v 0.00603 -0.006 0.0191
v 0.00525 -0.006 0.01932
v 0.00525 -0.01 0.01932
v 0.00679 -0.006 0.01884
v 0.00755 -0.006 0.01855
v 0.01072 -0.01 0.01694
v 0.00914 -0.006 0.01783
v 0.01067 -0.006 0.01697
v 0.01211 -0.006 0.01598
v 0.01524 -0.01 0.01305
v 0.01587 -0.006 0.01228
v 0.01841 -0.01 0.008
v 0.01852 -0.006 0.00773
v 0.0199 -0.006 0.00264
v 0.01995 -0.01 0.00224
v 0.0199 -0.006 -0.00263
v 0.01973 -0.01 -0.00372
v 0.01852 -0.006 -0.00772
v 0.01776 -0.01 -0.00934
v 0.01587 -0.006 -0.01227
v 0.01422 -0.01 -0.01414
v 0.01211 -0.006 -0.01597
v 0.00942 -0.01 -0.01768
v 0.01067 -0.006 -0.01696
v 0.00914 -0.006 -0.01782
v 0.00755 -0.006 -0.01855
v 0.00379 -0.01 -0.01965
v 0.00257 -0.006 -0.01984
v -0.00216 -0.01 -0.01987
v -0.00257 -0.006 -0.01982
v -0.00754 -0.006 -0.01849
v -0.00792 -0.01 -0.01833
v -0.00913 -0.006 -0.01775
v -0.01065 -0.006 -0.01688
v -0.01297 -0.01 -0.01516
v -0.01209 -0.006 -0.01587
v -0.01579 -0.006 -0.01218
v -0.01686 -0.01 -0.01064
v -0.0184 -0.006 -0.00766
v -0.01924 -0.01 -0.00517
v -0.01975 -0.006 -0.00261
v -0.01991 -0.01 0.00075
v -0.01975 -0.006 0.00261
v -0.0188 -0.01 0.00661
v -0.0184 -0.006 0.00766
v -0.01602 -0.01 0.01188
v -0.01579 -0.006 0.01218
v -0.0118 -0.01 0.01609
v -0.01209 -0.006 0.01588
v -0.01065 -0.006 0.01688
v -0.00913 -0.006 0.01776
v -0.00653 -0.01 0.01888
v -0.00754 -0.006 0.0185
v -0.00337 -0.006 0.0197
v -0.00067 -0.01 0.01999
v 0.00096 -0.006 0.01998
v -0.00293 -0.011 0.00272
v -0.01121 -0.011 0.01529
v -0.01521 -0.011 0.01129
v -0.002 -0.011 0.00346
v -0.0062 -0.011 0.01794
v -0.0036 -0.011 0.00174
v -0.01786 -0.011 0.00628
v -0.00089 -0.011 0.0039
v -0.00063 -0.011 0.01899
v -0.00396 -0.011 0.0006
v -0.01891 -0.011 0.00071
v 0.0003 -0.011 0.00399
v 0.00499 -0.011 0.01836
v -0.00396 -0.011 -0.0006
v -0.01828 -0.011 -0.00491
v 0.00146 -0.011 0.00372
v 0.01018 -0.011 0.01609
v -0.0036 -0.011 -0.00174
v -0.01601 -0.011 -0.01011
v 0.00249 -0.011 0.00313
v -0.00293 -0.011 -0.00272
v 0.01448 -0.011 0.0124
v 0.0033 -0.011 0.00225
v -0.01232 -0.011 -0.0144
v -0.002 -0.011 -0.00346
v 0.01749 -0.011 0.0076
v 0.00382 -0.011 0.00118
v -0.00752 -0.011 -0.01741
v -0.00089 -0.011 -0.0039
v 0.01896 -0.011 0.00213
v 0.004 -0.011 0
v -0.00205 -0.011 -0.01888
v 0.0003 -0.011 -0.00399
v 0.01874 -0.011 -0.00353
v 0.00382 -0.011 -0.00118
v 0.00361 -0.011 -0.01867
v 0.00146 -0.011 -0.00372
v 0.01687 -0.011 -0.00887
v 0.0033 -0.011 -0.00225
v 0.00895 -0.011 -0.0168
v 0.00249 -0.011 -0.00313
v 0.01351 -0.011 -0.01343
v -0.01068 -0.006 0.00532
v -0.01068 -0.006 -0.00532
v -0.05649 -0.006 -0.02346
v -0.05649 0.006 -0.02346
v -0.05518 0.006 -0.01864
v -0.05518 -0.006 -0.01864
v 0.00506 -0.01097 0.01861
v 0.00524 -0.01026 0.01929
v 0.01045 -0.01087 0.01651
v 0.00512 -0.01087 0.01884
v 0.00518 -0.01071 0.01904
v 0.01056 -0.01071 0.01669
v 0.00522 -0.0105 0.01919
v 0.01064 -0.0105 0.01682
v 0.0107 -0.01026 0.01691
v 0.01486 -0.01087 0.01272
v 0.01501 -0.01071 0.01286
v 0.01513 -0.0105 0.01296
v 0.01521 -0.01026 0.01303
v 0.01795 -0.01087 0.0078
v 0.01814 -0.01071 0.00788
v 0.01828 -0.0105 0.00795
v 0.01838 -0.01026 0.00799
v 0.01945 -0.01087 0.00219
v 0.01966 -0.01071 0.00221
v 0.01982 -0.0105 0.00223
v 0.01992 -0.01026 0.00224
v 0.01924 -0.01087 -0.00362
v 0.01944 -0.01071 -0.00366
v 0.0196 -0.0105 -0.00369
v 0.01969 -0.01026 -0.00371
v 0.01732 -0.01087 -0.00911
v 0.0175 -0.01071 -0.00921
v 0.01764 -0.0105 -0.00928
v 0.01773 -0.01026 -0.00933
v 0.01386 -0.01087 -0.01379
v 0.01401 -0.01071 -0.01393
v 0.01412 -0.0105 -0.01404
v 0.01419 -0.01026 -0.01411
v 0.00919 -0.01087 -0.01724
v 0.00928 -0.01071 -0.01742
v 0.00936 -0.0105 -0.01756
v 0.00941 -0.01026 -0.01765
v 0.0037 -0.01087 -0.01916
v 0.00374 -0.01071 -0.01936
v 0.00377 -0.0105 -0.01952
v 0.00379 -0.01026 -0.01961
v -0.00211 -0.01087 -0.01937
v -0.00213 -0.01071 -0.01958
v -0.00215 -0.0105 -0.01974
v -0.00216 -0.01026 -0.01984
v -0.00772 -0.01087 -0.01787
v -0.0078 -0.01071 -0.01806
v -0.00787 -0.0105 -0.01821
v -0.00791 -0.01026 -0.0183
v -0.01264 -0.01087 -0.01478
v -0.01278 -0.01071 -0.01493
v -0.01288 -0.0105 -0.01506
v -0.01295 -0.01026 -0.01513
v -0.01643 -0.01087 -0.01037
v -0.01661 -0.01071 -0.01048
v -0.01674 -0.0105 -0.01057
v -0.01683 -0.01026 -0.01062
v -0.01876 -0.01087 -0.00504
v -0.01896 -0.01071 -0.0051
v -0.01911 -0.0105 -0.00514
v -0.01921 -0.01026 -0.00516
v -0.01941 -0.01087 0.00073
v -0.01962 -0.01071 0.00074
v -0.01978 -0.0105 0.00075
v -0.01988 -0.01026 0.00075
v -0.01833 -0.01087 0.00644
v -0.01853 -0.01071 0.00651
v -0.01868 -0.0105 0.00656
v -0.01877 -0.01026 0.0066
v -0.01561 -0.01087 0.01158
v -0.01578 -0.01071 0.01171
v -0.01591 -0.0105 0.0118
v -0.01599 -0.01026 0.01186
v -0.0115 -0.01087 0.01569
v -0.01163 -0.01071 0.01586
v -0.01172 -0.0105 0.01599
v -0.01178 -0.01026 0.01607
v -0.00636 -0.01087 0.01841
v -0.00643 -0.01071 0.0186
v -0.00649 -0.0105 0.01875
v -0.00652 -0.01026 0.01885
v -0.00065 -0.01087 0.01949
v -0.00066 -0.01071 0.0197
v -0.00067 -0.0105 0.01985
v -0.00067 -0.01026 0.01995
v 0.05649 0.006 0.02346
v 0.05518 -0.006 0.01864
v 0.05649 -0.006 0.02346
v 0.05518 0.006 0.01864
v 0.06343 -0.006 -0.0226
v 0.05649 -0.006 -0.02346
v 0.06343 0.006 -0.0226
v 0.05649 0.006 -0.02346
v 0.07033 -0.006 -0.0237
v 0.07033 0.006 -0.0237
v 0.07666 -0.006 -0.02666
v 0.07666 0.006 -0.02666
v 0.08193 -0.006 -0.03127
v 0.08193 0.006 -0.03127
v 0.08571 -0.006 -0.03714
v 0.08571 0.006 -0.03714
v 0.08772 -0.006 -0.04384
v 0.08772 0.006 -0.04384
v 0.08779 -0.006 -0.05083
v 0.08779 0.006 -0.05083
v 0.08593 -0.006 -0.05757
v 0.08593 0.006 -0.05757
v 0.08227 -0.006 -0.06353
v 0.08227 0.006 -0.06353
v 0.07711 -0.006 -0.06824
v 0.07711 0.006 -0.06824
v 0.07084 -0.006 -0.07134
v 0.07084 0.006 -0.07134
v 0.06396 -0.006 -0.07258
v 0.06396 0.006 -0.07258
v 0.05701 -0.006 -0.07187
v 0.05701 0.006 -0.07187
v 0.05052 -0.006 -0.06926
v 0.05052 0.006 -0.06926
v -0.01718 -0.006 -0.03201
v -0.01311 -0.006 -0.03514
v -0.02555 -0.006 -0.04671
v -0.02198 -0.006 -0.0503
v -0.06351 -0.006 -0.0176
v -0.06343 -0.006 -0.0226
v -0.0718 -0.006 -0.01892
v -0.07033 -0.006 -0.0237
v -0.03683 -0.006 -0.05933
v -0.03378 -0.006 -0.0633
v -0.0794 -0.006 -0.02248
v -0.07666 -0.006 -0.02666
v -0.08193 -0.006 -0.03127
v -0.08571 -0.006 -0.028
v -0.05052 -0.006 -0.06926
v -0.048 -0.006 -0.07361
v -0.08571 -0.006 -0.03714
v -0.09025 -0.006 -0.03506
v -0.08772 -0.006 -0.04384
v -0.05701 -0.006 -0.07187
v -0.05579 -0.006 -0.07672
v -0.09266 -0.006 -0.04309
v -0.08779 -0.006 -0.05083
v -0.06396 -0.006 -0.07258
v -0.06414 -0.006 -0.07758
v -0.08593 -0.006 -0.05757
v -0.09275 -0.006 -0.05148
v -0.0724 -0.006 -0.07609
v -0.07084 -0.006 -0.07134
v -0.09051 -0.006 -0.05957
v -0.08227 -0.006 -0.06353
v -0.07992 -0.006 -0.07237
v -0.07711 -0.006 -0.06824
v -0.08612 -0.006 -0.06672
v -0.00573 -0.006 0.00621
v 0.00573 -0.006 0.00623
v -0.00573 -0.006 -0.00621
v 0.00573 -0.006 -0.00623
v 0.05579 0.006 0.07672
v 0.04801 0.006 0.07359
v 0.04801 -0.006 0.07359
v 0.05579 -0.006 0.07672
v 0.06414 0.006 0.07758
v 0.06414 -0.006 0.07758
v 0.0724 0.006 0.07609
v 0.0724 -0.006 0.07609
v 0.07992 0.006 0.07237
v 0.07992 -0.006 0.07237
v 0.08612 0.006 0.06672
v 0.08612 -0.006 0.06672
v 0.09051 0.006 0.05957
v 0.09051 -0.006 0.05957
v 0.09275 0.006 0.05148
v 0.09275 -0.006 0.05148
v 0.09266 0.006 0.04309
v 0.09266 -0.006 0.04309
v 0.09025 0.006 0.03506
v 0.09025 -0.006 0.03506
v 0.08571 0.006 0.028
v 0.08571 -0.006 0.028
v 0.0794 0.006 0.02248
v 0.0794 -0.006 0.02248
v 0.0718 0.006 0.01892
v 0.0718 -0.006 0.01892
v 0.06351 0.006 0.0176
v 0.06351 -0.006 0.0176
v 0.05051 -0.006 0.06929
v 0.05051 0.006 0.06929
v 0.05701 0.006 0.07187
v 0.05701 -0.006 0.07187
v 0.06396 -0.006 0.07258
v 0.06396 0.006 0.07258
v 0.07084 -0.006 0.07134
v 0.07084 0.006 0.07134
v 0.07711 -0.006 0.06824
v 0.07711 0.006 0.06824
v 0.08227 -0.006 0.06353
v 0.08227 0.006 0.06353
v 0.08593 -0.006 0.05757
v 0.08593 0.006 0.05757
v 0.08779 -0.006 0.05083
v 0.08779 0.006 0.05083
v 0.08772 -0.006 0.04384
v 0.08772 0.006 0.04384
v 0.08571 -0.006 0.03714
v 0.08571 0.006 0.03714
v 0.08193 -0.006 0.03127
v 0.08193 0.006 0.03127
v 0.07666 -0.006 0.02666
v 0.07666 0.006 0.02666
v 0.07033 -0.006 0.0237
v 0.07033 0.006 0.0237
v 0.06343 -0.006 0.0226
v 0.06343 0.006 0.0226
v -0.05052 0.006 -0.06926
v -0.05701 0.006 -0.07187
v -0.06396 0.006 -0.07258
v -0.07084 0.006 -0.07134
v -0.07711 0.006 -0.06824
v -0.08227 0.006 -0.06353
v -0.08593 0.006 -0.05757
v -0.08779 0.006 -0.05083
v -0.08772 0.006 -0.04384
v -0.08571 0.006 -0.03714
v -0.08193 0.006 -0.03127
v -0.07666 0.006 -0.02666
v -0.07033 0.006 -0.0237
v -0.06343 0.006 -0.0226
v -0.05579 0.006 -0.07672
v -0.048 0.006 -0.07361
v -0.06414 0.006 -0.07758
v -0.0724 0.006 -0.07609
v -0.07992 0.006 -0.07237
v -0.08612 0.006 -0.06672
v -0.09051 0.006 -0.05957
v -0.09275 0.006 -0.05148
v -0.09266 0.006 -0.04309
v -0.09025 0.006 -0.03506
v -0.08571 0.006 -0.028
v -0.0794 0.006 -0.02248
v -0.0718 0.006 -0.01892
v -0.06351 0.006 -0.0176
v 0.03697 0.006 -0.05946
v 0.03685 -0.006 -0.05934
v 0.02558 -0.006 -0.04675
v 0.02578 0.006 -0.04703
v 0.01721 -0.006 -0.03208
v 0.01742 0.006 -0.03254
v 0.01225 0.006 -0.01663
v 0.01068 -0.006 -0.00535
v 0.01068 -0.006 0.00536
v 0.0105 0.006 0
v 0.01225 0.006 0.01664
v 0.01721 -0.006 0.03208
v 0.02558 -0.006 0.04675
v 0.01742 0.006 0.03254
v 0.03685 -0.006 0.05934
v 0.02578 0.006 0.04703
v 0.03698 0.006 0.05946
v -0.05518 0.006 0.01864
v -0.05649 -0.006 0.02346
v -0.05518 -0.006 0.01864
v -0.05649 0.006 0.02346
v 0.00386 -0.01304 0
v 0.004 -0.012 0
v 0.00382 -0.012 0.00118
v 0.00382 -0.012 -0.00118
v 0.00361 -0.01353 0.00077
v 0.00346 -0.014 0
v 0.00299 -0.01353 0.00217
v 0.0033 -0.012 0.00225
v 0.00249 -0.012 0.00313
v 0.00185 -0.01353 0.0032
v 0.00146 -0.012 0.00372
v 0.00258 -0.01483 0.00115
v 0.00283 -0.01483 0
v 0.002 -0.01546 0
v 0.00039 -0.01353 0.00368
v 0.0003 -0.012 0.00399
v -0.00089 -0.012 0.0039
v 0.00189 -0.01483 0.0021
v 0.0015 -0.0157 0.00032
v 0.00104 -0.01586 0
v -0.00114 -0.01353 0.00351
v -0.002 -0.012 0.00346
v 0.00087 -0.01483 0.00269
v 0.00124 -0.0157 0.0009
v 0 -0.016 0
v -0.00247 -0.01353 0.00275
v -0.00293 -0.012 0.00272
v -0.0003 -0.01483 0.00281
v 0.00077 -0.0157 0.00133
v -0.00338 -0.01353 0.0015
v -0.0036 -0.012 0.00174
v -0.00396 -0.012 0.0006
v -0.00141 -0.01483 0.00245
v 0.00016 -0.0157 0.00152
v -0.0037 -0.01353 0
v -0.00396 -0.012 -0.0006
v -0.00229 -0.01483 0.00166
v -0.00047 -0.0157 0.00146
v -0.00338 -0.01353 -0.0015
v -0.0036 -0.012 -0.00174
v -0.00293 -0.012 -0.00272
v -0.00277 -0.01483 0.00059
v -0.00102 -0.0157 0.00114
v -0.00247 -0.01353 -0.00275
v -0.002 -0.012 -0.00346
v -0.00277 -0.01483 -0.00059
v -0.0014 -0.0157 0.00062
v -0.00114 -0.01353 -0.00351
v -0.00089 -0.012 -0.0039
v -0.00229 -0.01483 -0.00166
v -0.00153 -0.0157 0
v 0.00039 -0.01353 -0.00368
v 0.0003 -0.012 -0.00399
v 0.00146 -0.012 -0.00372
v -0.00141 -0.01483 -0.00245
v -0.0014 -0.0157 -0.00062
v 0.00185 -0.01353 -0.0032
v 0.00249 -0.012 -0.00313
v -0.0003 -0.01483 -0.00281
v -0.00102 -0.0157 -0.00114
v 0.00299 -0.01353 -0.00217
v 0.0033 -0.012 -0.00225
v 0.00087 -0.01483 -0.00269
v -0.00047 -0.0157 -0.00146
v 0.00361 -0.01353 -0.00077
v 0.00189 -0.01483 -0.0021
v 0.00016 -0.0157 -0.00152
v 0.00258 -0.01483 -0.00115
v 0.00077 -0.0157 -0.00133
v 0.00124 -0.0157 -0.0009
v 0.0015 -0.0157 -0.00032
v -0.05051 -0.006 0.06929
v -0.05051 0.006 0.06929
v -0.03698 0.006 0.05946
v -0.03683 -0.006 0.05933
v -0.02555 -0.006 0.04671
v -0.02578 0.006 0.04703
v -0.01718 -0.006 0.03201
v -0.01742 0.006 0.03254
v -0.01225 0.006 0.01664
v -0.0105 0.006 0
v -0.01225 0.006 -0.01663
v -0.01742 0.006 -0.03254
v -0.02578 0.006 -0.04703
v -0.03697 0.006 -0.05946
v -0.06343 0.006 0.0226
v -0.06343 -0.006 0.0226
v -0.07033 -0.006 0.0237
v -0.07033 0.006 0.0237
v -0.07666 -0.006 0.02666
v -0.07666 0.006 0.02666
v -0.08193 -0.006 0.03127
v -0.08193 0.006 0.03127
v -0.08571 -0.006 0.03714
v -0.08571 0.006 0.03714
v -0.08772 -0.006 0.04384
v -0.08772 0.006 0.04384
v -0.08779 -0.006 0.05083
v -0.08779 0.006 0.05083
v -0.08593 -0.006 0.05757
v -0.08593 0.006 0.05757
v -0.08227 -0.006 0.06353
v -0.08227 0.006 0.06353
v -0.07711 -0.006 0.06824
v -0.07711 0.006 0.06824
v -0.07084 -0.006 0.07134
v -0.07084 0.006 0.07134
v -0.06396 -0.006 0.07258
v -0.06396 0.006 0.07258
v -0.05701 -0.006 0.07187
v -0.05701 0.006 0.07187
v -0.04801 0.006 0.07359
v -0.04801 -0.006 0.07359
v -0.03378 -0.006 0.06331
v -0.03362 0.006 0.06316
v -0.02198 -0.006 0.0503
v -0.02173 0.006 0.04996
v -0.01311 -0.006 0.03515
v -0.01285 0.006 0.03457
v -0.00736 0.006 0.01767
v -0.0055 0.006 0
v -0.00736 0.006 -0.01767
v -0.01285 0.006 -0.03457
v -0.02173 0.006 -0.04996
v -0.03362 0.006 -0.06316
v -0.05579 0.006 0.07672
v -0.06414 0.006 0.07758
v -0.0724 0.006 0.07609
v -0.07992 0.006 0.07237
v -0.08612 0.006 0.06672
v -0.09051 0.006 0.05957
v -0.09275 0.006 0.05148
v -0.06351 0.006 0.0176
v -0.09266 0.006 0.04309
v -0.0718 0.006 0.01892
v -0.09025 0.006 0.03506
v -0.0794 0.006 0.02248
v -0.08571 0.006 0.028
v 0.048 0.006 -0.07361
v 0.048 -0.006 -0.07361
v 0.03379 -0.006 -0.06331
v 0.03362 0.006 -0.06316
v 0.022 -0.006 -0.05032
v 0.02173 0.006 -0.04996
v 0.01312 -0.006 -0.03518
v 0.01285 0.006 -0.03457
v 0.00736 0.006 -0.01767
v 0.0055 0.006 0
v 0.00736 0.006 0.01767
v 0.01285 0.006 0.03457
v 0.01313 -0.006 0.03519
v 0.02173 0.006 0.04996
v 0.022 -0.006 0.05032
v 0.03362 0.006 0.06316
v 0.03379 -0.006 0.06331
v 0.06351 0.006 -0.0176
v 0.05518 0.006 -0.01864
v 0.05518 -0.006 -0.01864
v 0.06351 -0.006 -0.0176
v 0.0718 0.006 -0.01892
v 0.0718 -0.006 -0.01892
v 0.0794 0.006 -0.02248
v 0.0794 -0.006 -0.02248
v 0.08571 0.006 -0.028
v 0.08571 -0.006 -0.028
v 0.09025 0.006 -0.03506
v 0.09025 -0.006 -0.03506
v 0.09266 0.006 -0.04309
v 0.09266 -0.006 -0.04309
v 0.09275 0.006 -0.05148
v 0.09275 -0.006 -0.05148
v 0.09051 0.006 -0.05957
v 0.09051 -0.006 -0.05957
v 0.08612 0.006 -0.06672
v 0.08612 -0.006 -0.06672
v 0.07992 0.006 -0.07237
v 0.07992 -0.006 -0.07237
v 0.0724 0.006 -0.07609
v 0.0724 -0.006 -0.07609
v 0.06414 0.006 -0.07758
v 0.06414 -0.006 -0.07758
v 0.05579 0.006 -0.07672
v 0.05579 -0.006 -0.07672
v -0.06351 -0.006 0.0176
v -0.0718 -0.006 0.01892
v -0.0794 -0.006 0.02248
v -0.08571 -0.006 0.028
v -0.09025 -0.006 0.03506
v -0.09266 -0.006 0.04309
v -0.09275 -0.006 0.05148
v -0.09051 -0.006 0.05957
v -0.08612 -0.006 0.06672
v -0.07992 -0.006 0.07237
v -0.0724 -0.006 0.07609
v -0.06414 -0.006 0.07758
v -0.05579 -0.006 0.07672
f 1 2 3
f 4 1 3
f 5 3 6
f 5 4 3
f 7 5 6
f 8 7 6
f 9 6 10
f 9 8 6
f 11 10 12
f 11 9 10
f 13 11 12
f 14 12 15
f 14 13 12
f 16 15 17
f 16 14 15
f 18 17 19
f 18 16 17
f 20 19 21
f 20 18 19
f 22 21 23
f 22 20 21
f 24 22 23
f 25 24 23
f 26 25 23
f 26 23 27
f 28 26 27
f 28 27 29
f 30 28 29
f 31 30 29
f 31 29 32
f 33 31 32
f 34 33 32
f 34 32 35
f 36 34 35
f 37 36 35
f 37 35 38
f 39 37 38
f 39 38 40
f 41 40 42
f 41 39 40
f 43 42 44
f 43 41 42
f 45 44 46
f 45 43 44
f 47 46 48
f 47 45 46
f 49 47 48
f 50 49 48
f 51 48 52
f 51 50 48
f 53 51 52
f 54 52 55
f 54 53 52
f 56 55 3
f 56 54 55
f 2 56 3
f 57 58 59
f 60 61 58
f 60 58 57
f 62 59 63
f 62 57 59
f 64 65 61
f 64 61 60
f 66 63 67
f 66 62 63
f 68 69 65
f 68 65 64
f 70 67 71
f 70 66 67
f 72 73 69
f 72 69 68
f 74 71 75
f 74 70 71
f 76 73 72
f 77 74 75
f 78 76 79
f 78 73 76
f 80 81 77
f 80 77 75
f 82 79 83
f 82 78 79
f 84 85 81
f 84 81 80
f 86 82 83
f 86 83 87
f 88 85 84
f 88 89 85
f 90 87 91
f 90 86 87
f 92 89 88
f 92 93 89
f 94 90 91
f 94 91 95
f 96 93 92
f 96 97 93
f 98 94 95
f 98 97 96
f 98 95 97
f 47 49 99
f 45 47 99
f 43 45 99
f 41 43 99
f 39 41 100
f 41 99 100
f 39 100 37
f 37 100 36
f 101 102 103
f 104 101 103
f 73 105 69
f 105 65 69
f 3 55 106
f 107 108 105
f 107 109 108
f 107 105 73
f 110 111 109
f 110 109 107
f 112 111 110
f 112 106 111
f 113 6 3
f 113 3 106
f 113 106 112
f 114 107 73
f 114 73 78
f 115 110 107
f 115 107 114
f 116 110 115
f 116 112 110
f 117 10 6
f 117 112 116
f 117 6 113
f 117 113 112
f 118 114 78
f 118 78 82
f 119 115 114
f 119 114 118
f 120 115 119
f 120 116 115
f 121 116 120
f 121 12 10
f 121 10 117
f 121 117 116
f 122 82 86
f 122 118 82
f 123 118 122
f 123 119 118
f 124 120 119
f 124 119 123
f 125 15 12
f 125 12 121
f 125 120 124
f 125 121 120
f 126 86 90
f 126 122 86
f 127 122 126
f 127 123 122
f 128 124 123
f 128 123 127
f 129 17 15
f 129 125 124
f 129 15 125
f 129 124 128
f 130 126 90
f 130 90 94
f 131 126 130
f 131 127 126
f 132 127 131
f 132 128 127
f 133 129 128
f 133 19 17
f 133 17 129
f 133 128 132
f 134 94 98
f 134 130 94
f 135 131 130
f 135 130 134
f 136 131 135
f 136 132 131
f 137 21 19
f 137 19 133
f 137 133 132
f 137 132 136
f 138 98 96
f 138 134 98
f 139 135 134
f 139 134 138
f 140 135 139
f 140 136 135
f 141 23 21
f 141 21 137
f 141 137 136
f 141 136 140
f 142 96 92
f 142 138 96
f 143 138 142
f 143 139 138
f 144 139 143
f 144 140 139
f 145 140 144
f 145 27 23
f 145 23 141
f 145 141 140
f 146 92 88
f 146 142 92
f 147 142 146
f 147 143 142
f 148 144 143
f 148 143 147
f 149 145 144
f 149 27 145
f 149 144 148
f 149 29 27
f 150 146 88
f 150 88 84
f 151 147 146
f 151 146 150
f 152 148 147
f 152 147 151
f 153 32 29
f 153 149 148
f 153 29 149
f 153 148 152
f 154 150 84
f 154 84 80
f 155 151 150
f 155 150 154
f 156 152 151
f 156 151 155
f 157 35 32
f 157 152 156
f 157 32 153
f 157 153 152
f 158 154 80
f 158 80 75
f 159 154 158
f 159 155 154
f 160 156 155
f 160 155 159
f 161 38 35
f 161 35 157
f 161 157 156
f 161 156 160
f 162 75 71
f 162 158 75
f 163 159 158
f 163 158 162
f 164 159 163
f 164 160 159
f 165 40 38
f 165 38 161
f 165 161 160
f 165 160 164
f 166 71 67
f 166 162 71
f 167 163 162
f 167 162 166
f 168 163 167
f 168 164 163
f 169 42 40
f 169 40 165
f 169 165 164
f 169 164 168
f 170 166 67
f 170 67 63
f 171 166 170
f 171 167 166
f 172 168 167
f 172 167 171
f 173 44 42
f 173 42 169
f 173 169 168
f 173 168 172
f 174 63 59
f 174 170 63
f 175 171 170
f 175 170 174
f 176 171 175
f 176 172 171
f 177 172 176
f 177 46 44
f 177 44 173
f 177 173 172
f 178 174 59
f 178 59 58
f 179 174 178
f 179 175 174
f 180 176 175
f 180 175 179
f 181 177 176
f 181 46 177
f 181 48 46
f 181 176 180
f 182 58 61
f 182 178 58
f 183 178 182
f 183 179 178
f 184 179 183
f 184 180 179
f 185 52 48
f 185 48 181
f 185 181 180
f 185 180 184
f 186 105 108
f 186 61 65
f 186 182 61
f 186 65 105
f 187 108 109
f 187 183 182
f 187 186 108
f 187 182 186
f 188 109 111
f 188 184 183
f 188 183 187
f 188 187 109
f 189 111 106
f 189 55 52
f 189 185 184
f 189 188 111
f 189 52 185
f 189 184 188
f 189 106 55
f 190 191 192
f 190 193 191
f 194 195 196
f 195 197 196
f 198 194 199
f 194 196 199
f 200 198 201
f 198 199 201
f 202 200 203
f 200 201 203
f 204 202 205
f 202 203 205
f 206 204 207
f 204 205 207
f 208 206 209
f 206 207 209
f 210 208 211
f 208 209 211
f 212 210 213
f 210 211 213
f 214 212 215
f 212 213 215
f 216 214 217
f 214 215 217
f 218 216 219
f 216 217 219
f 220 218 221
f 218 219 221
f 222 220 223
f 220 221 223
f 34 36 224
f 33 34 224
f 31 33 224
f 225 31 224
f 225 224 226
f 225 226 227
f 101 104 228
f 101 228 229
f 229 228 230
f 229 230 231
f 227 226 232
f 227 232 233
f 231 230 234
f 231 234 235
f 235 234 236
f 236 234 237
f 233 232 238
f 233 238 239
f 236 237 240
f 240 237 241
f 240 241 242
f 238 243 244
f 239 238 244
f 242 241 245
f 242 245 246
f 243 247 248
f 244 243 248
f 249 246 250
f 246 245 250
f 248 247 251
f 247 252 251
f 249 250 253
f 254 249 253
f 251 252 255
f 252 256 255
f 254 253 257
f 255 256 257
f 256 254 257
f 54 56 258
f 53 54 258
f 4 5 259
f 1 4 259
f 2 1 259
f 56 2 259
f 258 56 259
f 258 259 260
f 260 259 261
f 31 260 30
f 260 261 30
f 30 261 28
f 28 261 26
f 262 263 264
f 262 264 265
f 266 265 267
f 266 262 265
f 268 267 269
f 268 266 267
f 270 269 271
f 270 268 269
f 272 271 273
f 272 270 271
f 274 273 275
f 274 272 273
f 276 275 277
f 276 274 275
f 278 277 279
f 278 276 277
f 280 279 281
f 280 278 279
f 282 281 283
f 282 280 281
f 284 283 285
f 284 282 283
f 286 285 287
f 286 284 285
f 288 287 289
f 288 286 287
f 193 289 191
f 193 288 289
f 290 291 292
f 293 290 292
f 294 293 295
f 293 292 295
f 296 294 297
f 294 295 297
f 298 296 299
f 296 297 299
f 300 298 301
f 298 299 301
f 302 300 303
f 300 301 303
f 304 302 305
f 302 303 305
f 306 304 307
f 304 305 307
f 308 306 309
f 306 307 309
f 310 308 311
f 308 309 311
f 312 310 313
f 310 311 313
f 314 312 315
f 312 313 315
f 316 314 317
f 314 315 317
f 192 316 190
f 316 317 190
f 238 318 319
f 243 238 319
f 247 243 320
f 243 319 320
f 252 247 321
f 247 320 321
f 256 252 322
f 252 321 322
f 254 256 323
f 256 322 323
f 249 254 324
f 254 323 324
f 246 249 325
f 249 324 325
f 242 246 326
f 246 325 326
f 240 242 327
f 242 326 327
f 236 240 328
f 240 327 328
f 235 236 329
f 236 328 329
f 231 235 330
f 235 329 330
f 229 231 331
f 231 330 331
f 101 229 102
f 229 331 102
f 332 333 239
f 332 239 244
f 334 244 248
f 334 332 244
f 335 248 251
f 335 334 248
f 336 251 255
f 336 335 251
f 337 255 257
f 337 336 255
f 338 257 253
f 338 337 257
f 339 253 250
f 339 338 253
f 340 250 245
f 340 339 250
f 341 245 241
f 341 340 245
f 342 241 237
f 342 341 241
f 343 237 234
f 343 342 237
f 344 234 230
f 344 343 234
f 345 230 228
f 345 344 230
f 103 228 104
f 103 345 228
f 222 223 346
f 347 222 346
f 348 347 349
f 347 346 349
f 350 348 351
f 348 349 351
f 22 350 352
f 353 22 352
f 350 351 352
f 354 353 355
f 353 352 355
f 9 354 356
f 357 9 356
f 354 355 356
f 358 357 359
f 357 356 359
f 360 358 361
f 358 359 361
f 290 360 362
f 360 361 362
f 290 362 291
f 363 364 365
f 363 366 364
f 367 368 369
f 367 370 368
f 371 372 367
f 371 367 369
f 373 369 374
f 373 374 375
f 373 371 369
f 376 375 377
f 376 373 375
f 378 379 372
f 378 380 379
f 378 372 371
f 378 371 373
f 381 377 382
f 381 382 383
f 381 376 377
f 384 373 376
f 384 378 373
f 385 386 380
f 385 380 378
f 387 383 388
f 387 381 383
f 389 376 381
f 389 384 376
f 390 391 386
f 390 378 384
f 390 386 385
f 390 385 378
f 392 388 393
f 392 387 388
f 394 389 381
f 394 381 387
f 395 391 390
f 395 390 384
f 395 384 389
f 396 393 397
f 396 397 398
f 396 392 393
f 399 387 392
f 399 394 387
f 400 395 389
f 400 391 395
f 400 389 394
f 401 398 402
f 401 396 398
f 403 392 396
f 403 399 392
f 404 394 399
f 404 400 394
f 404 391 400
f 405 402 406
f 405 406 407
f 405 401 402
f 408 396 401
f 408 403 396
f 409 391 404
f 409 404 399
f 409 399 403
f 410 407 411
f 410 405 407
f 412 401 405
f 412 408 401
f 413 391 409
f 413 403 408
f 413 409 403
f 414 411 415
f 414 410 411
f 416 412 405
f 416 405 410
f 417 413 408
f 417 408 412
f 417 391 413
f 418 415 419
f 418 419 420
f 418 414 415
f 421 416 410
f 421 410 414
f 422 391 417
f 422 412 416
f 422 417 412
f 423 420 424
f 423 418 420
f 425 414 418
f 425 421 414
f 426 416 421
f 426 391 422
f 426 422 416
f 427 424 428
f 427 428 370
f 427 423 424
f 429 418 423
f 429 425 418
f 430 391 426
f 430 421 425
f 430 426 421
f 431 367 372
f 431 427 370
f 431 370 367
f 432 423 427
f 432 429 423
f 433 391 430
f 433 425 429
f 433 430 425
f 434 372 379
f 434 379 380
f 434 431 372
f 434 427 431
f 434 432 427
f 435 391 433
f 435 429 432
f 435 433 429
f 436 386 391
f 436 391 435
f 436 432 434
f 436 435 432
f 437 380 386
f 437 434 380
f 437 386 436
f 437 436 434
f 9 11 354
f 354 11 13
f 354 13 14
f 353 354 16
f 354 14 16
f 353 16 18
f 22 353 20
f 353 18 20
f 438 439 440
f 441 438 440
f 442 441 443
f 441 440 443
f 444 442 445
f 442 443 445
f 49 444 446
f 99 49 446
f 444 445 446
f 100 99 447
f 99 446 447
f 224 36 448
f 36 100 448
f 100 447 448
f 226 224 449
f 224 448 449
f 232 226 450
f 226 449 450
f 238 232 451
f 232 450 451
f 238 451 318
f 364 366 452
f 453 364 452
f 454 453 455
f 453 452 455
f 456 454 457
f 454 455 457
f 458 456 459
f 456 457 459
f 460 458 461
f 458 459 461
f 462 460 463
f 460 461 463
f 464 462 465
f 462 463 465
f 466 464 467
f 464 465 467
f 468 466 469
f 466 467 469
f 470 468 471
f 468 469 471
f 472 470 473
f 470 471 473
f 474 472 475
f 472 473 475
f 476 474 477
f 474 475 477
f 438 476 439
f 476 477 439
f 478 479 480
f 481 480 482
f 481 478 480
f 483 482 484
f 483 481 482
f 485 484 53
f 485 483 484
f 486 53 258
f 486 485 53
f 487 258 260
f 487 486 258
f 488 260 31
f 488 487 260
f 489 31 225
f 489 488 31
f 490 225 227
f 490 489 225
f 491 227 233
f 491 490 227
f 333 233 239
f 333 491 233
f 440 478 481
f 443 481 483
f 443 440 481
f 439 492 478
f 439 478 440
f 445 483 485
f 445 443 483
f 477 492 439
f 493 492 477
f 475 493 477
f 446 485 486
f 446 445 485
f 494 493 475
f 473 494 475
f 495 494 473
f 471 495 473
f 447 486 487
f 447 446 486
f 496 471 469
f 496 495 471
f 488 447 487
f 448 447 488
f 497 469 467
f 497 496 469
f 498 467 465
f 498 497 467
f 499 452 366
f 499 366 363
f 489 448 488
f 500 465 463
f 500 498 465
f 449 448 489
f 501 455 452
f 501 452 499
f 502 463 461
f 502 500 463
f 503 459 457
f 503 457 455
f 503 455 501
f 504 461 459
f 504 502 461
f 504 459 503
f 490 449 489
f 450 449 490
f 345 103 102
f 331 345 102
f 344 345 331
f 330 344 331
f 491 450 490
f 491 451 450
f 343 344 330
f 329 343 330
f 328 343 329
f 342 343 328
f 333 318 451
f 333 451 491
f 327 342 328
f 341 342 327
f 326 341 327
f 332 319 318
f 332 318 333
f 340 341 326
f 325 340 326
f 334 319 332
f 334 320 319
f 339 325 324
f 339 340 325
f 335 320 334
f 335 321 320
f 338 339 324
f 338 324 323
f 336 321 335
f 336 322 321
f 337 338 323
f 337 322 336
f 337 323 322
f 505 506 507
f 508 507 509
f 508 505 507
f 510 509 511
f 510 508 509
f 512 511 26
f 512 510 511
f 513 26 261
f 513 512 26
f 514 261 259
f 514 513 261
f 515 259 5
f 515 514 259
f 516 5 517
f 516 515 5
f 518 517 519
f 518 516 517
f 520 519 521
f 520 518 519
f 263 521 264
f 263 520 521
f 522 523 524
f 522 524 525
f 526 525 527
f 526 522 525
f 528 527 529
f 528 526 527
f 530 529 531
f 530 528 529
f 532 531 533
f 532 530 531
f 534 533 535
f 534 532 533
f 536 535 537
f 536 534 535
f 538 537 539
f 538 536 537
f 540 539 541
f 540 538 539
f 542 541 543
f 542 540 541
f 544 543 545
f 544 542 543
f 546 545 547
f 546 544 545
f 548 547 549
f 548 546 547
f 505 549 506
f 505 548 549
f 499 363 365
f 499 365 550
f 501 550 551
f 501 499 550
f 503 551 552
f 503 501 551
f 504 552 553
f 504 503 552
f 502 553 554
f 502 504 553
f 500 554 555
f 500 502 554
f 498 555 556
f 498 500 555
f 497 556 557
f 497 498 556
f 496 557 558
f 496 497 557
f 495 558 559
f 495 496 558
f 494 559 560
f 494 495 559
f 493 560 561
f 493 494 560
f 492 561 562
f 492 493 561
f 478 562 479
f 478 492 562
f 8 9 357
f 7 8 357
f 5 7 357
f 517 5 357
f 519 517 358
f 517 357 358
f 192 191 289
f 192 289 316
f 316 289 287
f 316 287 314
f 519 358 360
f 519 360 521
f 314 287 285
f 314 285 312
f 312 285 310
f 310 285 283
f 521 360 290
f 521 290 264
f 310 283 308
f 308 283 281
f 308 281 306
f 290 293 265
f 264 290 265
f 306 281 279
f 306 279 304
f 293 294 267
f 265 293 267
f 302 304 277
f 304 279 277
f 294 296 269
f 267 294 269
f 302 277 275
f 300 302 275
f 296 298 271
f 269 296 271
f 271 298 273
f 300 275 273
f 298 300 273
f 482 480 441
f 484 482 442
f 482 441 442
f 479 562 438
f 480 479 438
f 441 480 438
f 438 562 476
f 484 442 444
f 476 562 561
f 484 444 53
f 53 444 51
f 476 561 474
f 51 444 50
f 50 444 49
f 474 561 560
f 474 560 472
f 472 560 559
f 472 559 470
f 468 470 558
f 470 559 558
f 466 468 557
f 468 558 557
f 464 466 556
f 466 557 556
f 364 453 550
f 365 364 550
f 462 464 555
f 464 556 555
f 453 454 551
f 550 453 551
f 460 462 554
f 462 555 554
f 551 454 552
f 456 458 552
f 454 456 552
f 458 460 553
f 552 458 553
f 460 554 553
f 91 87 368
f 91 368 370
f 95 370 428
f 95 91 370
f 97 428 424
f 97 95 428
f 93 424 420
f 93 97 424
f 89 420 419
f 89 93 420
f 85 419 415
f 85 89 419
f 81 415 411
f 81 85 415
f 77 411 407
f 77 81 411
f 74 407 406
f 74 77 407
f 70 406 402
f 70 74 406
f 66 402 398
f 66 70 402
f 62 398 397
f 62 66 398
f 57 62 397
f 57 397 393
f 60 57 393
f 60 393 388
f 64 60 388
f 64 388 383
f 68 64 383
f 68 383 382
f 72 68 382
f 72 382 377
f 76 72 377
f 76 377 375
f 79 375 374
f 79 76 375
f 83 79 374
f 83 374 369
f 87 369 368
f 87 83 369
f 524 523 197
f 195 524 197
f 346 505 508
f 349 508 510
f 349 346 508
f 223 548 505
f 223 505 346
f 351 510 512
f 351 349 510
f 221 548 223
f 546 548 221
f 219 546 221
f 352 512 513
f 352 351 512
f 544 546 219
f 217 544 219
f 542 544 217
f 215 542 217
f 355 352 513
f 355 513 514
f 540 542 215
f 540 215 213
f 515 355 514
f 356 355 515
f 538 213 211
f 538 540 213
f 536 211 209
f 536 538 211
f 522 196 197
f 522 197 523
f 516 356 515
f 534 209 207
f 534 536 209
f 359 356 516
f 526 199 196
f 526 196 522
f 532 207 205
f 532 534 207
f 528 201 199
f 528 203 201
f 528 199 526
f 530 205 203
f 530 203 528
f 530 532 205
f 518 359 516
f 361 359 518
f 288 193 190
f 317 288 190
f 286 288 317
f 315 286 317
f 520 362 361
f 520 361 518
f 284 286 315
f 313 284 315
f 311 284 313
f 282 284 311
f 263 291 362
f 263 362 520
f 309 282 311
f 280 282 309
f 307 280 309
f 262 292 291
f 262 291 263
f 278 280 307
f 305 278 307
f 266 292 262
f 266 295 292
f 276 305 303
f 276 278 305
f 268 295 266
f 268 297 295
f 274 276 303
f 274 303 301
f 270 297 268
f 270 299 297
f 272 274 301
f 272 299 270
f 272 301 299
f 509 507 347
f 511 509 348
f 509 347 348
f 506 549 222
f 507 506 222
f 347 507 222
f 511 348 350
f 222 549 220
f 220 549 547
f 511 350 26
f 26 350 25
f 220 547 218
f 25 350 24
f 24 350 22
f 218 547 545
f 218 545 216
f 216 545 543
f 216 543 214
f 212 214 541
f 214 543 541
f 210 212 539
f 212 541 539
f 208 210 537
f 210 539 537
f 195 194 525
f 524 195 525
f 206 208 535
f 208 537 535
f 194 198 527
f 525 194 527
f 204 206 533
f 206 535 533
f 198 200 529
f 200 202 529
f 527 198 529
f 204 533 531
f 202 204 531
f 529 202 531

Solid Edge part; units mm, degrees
sketch "Sketch1" plane through (0, 0, 0) normal (0, -1, 0) x (1, 0, 0)
  line L0 (0.0552, 0.0187) -> (0.0565, 0.0235)
  arc A0 (0.048, 0.0736) -> (0.0552, 0.0187) centre (0.063, 0.0476) cw
  arc A1 (0.048, -0.0736) -> (0.048, 0.0736) centre (0.0905, 0) cw
  arc A2 (0.0552, -0.0187) -> (0.048, -0.0736) centre (0.063, -0.0476) cw
  line L1 (0.0552, -0.0187) -> (0.0565, -0.0235)
  arc A3 (0.0565, -0.0235) -> (0.0505, -0.0693) centre (0.063, -0.0476) cw
  arc A4 (0.0505, -0.0693) -> (0.0505, 0.0693) centre (0.0905, 0) cw
  arc A5 (0.0505, 0.0693) -> (0.0565, 0.0235) centre (0.063, 0.0476) cw
extrude "Protrusion1" add sketch "Sketch1" along normal mid plane 0.012
mirror "Mirror1" about plane through (0, 0, 0) normal (1, 0, 0) of "Protrusion1"
sketch "Sketch2" plane through (0.0507, -0.006, 0) normal (0, -1, 0) x (0.258819, 0, 0.9659258)
  circle A0 centre (-0.0131, 0.0489) radius 0.02
  dimension "D1" = 0.04
extrude "Ausprägung_2" add sketch "Sketch2" along normal blind 0.005
sketch "Sketch3" plane through (0, -0.011, 0) normal (0, -1, 0) x (1, 0, 0)
  circle A0 centre (0, 0) radius 0.004
  dimension "D1" = 0.008
extrude "Ausprägung_3" add sketch "Sketch3" along normal blind 0.005
fillet "Verrundung_1" radius 0.004 1 edges at (-0.004, -0.016, 0)
fillet "Verrundung_2" radius 0.001 1 edges at (-0.0052, -0.011, -0.0193)
